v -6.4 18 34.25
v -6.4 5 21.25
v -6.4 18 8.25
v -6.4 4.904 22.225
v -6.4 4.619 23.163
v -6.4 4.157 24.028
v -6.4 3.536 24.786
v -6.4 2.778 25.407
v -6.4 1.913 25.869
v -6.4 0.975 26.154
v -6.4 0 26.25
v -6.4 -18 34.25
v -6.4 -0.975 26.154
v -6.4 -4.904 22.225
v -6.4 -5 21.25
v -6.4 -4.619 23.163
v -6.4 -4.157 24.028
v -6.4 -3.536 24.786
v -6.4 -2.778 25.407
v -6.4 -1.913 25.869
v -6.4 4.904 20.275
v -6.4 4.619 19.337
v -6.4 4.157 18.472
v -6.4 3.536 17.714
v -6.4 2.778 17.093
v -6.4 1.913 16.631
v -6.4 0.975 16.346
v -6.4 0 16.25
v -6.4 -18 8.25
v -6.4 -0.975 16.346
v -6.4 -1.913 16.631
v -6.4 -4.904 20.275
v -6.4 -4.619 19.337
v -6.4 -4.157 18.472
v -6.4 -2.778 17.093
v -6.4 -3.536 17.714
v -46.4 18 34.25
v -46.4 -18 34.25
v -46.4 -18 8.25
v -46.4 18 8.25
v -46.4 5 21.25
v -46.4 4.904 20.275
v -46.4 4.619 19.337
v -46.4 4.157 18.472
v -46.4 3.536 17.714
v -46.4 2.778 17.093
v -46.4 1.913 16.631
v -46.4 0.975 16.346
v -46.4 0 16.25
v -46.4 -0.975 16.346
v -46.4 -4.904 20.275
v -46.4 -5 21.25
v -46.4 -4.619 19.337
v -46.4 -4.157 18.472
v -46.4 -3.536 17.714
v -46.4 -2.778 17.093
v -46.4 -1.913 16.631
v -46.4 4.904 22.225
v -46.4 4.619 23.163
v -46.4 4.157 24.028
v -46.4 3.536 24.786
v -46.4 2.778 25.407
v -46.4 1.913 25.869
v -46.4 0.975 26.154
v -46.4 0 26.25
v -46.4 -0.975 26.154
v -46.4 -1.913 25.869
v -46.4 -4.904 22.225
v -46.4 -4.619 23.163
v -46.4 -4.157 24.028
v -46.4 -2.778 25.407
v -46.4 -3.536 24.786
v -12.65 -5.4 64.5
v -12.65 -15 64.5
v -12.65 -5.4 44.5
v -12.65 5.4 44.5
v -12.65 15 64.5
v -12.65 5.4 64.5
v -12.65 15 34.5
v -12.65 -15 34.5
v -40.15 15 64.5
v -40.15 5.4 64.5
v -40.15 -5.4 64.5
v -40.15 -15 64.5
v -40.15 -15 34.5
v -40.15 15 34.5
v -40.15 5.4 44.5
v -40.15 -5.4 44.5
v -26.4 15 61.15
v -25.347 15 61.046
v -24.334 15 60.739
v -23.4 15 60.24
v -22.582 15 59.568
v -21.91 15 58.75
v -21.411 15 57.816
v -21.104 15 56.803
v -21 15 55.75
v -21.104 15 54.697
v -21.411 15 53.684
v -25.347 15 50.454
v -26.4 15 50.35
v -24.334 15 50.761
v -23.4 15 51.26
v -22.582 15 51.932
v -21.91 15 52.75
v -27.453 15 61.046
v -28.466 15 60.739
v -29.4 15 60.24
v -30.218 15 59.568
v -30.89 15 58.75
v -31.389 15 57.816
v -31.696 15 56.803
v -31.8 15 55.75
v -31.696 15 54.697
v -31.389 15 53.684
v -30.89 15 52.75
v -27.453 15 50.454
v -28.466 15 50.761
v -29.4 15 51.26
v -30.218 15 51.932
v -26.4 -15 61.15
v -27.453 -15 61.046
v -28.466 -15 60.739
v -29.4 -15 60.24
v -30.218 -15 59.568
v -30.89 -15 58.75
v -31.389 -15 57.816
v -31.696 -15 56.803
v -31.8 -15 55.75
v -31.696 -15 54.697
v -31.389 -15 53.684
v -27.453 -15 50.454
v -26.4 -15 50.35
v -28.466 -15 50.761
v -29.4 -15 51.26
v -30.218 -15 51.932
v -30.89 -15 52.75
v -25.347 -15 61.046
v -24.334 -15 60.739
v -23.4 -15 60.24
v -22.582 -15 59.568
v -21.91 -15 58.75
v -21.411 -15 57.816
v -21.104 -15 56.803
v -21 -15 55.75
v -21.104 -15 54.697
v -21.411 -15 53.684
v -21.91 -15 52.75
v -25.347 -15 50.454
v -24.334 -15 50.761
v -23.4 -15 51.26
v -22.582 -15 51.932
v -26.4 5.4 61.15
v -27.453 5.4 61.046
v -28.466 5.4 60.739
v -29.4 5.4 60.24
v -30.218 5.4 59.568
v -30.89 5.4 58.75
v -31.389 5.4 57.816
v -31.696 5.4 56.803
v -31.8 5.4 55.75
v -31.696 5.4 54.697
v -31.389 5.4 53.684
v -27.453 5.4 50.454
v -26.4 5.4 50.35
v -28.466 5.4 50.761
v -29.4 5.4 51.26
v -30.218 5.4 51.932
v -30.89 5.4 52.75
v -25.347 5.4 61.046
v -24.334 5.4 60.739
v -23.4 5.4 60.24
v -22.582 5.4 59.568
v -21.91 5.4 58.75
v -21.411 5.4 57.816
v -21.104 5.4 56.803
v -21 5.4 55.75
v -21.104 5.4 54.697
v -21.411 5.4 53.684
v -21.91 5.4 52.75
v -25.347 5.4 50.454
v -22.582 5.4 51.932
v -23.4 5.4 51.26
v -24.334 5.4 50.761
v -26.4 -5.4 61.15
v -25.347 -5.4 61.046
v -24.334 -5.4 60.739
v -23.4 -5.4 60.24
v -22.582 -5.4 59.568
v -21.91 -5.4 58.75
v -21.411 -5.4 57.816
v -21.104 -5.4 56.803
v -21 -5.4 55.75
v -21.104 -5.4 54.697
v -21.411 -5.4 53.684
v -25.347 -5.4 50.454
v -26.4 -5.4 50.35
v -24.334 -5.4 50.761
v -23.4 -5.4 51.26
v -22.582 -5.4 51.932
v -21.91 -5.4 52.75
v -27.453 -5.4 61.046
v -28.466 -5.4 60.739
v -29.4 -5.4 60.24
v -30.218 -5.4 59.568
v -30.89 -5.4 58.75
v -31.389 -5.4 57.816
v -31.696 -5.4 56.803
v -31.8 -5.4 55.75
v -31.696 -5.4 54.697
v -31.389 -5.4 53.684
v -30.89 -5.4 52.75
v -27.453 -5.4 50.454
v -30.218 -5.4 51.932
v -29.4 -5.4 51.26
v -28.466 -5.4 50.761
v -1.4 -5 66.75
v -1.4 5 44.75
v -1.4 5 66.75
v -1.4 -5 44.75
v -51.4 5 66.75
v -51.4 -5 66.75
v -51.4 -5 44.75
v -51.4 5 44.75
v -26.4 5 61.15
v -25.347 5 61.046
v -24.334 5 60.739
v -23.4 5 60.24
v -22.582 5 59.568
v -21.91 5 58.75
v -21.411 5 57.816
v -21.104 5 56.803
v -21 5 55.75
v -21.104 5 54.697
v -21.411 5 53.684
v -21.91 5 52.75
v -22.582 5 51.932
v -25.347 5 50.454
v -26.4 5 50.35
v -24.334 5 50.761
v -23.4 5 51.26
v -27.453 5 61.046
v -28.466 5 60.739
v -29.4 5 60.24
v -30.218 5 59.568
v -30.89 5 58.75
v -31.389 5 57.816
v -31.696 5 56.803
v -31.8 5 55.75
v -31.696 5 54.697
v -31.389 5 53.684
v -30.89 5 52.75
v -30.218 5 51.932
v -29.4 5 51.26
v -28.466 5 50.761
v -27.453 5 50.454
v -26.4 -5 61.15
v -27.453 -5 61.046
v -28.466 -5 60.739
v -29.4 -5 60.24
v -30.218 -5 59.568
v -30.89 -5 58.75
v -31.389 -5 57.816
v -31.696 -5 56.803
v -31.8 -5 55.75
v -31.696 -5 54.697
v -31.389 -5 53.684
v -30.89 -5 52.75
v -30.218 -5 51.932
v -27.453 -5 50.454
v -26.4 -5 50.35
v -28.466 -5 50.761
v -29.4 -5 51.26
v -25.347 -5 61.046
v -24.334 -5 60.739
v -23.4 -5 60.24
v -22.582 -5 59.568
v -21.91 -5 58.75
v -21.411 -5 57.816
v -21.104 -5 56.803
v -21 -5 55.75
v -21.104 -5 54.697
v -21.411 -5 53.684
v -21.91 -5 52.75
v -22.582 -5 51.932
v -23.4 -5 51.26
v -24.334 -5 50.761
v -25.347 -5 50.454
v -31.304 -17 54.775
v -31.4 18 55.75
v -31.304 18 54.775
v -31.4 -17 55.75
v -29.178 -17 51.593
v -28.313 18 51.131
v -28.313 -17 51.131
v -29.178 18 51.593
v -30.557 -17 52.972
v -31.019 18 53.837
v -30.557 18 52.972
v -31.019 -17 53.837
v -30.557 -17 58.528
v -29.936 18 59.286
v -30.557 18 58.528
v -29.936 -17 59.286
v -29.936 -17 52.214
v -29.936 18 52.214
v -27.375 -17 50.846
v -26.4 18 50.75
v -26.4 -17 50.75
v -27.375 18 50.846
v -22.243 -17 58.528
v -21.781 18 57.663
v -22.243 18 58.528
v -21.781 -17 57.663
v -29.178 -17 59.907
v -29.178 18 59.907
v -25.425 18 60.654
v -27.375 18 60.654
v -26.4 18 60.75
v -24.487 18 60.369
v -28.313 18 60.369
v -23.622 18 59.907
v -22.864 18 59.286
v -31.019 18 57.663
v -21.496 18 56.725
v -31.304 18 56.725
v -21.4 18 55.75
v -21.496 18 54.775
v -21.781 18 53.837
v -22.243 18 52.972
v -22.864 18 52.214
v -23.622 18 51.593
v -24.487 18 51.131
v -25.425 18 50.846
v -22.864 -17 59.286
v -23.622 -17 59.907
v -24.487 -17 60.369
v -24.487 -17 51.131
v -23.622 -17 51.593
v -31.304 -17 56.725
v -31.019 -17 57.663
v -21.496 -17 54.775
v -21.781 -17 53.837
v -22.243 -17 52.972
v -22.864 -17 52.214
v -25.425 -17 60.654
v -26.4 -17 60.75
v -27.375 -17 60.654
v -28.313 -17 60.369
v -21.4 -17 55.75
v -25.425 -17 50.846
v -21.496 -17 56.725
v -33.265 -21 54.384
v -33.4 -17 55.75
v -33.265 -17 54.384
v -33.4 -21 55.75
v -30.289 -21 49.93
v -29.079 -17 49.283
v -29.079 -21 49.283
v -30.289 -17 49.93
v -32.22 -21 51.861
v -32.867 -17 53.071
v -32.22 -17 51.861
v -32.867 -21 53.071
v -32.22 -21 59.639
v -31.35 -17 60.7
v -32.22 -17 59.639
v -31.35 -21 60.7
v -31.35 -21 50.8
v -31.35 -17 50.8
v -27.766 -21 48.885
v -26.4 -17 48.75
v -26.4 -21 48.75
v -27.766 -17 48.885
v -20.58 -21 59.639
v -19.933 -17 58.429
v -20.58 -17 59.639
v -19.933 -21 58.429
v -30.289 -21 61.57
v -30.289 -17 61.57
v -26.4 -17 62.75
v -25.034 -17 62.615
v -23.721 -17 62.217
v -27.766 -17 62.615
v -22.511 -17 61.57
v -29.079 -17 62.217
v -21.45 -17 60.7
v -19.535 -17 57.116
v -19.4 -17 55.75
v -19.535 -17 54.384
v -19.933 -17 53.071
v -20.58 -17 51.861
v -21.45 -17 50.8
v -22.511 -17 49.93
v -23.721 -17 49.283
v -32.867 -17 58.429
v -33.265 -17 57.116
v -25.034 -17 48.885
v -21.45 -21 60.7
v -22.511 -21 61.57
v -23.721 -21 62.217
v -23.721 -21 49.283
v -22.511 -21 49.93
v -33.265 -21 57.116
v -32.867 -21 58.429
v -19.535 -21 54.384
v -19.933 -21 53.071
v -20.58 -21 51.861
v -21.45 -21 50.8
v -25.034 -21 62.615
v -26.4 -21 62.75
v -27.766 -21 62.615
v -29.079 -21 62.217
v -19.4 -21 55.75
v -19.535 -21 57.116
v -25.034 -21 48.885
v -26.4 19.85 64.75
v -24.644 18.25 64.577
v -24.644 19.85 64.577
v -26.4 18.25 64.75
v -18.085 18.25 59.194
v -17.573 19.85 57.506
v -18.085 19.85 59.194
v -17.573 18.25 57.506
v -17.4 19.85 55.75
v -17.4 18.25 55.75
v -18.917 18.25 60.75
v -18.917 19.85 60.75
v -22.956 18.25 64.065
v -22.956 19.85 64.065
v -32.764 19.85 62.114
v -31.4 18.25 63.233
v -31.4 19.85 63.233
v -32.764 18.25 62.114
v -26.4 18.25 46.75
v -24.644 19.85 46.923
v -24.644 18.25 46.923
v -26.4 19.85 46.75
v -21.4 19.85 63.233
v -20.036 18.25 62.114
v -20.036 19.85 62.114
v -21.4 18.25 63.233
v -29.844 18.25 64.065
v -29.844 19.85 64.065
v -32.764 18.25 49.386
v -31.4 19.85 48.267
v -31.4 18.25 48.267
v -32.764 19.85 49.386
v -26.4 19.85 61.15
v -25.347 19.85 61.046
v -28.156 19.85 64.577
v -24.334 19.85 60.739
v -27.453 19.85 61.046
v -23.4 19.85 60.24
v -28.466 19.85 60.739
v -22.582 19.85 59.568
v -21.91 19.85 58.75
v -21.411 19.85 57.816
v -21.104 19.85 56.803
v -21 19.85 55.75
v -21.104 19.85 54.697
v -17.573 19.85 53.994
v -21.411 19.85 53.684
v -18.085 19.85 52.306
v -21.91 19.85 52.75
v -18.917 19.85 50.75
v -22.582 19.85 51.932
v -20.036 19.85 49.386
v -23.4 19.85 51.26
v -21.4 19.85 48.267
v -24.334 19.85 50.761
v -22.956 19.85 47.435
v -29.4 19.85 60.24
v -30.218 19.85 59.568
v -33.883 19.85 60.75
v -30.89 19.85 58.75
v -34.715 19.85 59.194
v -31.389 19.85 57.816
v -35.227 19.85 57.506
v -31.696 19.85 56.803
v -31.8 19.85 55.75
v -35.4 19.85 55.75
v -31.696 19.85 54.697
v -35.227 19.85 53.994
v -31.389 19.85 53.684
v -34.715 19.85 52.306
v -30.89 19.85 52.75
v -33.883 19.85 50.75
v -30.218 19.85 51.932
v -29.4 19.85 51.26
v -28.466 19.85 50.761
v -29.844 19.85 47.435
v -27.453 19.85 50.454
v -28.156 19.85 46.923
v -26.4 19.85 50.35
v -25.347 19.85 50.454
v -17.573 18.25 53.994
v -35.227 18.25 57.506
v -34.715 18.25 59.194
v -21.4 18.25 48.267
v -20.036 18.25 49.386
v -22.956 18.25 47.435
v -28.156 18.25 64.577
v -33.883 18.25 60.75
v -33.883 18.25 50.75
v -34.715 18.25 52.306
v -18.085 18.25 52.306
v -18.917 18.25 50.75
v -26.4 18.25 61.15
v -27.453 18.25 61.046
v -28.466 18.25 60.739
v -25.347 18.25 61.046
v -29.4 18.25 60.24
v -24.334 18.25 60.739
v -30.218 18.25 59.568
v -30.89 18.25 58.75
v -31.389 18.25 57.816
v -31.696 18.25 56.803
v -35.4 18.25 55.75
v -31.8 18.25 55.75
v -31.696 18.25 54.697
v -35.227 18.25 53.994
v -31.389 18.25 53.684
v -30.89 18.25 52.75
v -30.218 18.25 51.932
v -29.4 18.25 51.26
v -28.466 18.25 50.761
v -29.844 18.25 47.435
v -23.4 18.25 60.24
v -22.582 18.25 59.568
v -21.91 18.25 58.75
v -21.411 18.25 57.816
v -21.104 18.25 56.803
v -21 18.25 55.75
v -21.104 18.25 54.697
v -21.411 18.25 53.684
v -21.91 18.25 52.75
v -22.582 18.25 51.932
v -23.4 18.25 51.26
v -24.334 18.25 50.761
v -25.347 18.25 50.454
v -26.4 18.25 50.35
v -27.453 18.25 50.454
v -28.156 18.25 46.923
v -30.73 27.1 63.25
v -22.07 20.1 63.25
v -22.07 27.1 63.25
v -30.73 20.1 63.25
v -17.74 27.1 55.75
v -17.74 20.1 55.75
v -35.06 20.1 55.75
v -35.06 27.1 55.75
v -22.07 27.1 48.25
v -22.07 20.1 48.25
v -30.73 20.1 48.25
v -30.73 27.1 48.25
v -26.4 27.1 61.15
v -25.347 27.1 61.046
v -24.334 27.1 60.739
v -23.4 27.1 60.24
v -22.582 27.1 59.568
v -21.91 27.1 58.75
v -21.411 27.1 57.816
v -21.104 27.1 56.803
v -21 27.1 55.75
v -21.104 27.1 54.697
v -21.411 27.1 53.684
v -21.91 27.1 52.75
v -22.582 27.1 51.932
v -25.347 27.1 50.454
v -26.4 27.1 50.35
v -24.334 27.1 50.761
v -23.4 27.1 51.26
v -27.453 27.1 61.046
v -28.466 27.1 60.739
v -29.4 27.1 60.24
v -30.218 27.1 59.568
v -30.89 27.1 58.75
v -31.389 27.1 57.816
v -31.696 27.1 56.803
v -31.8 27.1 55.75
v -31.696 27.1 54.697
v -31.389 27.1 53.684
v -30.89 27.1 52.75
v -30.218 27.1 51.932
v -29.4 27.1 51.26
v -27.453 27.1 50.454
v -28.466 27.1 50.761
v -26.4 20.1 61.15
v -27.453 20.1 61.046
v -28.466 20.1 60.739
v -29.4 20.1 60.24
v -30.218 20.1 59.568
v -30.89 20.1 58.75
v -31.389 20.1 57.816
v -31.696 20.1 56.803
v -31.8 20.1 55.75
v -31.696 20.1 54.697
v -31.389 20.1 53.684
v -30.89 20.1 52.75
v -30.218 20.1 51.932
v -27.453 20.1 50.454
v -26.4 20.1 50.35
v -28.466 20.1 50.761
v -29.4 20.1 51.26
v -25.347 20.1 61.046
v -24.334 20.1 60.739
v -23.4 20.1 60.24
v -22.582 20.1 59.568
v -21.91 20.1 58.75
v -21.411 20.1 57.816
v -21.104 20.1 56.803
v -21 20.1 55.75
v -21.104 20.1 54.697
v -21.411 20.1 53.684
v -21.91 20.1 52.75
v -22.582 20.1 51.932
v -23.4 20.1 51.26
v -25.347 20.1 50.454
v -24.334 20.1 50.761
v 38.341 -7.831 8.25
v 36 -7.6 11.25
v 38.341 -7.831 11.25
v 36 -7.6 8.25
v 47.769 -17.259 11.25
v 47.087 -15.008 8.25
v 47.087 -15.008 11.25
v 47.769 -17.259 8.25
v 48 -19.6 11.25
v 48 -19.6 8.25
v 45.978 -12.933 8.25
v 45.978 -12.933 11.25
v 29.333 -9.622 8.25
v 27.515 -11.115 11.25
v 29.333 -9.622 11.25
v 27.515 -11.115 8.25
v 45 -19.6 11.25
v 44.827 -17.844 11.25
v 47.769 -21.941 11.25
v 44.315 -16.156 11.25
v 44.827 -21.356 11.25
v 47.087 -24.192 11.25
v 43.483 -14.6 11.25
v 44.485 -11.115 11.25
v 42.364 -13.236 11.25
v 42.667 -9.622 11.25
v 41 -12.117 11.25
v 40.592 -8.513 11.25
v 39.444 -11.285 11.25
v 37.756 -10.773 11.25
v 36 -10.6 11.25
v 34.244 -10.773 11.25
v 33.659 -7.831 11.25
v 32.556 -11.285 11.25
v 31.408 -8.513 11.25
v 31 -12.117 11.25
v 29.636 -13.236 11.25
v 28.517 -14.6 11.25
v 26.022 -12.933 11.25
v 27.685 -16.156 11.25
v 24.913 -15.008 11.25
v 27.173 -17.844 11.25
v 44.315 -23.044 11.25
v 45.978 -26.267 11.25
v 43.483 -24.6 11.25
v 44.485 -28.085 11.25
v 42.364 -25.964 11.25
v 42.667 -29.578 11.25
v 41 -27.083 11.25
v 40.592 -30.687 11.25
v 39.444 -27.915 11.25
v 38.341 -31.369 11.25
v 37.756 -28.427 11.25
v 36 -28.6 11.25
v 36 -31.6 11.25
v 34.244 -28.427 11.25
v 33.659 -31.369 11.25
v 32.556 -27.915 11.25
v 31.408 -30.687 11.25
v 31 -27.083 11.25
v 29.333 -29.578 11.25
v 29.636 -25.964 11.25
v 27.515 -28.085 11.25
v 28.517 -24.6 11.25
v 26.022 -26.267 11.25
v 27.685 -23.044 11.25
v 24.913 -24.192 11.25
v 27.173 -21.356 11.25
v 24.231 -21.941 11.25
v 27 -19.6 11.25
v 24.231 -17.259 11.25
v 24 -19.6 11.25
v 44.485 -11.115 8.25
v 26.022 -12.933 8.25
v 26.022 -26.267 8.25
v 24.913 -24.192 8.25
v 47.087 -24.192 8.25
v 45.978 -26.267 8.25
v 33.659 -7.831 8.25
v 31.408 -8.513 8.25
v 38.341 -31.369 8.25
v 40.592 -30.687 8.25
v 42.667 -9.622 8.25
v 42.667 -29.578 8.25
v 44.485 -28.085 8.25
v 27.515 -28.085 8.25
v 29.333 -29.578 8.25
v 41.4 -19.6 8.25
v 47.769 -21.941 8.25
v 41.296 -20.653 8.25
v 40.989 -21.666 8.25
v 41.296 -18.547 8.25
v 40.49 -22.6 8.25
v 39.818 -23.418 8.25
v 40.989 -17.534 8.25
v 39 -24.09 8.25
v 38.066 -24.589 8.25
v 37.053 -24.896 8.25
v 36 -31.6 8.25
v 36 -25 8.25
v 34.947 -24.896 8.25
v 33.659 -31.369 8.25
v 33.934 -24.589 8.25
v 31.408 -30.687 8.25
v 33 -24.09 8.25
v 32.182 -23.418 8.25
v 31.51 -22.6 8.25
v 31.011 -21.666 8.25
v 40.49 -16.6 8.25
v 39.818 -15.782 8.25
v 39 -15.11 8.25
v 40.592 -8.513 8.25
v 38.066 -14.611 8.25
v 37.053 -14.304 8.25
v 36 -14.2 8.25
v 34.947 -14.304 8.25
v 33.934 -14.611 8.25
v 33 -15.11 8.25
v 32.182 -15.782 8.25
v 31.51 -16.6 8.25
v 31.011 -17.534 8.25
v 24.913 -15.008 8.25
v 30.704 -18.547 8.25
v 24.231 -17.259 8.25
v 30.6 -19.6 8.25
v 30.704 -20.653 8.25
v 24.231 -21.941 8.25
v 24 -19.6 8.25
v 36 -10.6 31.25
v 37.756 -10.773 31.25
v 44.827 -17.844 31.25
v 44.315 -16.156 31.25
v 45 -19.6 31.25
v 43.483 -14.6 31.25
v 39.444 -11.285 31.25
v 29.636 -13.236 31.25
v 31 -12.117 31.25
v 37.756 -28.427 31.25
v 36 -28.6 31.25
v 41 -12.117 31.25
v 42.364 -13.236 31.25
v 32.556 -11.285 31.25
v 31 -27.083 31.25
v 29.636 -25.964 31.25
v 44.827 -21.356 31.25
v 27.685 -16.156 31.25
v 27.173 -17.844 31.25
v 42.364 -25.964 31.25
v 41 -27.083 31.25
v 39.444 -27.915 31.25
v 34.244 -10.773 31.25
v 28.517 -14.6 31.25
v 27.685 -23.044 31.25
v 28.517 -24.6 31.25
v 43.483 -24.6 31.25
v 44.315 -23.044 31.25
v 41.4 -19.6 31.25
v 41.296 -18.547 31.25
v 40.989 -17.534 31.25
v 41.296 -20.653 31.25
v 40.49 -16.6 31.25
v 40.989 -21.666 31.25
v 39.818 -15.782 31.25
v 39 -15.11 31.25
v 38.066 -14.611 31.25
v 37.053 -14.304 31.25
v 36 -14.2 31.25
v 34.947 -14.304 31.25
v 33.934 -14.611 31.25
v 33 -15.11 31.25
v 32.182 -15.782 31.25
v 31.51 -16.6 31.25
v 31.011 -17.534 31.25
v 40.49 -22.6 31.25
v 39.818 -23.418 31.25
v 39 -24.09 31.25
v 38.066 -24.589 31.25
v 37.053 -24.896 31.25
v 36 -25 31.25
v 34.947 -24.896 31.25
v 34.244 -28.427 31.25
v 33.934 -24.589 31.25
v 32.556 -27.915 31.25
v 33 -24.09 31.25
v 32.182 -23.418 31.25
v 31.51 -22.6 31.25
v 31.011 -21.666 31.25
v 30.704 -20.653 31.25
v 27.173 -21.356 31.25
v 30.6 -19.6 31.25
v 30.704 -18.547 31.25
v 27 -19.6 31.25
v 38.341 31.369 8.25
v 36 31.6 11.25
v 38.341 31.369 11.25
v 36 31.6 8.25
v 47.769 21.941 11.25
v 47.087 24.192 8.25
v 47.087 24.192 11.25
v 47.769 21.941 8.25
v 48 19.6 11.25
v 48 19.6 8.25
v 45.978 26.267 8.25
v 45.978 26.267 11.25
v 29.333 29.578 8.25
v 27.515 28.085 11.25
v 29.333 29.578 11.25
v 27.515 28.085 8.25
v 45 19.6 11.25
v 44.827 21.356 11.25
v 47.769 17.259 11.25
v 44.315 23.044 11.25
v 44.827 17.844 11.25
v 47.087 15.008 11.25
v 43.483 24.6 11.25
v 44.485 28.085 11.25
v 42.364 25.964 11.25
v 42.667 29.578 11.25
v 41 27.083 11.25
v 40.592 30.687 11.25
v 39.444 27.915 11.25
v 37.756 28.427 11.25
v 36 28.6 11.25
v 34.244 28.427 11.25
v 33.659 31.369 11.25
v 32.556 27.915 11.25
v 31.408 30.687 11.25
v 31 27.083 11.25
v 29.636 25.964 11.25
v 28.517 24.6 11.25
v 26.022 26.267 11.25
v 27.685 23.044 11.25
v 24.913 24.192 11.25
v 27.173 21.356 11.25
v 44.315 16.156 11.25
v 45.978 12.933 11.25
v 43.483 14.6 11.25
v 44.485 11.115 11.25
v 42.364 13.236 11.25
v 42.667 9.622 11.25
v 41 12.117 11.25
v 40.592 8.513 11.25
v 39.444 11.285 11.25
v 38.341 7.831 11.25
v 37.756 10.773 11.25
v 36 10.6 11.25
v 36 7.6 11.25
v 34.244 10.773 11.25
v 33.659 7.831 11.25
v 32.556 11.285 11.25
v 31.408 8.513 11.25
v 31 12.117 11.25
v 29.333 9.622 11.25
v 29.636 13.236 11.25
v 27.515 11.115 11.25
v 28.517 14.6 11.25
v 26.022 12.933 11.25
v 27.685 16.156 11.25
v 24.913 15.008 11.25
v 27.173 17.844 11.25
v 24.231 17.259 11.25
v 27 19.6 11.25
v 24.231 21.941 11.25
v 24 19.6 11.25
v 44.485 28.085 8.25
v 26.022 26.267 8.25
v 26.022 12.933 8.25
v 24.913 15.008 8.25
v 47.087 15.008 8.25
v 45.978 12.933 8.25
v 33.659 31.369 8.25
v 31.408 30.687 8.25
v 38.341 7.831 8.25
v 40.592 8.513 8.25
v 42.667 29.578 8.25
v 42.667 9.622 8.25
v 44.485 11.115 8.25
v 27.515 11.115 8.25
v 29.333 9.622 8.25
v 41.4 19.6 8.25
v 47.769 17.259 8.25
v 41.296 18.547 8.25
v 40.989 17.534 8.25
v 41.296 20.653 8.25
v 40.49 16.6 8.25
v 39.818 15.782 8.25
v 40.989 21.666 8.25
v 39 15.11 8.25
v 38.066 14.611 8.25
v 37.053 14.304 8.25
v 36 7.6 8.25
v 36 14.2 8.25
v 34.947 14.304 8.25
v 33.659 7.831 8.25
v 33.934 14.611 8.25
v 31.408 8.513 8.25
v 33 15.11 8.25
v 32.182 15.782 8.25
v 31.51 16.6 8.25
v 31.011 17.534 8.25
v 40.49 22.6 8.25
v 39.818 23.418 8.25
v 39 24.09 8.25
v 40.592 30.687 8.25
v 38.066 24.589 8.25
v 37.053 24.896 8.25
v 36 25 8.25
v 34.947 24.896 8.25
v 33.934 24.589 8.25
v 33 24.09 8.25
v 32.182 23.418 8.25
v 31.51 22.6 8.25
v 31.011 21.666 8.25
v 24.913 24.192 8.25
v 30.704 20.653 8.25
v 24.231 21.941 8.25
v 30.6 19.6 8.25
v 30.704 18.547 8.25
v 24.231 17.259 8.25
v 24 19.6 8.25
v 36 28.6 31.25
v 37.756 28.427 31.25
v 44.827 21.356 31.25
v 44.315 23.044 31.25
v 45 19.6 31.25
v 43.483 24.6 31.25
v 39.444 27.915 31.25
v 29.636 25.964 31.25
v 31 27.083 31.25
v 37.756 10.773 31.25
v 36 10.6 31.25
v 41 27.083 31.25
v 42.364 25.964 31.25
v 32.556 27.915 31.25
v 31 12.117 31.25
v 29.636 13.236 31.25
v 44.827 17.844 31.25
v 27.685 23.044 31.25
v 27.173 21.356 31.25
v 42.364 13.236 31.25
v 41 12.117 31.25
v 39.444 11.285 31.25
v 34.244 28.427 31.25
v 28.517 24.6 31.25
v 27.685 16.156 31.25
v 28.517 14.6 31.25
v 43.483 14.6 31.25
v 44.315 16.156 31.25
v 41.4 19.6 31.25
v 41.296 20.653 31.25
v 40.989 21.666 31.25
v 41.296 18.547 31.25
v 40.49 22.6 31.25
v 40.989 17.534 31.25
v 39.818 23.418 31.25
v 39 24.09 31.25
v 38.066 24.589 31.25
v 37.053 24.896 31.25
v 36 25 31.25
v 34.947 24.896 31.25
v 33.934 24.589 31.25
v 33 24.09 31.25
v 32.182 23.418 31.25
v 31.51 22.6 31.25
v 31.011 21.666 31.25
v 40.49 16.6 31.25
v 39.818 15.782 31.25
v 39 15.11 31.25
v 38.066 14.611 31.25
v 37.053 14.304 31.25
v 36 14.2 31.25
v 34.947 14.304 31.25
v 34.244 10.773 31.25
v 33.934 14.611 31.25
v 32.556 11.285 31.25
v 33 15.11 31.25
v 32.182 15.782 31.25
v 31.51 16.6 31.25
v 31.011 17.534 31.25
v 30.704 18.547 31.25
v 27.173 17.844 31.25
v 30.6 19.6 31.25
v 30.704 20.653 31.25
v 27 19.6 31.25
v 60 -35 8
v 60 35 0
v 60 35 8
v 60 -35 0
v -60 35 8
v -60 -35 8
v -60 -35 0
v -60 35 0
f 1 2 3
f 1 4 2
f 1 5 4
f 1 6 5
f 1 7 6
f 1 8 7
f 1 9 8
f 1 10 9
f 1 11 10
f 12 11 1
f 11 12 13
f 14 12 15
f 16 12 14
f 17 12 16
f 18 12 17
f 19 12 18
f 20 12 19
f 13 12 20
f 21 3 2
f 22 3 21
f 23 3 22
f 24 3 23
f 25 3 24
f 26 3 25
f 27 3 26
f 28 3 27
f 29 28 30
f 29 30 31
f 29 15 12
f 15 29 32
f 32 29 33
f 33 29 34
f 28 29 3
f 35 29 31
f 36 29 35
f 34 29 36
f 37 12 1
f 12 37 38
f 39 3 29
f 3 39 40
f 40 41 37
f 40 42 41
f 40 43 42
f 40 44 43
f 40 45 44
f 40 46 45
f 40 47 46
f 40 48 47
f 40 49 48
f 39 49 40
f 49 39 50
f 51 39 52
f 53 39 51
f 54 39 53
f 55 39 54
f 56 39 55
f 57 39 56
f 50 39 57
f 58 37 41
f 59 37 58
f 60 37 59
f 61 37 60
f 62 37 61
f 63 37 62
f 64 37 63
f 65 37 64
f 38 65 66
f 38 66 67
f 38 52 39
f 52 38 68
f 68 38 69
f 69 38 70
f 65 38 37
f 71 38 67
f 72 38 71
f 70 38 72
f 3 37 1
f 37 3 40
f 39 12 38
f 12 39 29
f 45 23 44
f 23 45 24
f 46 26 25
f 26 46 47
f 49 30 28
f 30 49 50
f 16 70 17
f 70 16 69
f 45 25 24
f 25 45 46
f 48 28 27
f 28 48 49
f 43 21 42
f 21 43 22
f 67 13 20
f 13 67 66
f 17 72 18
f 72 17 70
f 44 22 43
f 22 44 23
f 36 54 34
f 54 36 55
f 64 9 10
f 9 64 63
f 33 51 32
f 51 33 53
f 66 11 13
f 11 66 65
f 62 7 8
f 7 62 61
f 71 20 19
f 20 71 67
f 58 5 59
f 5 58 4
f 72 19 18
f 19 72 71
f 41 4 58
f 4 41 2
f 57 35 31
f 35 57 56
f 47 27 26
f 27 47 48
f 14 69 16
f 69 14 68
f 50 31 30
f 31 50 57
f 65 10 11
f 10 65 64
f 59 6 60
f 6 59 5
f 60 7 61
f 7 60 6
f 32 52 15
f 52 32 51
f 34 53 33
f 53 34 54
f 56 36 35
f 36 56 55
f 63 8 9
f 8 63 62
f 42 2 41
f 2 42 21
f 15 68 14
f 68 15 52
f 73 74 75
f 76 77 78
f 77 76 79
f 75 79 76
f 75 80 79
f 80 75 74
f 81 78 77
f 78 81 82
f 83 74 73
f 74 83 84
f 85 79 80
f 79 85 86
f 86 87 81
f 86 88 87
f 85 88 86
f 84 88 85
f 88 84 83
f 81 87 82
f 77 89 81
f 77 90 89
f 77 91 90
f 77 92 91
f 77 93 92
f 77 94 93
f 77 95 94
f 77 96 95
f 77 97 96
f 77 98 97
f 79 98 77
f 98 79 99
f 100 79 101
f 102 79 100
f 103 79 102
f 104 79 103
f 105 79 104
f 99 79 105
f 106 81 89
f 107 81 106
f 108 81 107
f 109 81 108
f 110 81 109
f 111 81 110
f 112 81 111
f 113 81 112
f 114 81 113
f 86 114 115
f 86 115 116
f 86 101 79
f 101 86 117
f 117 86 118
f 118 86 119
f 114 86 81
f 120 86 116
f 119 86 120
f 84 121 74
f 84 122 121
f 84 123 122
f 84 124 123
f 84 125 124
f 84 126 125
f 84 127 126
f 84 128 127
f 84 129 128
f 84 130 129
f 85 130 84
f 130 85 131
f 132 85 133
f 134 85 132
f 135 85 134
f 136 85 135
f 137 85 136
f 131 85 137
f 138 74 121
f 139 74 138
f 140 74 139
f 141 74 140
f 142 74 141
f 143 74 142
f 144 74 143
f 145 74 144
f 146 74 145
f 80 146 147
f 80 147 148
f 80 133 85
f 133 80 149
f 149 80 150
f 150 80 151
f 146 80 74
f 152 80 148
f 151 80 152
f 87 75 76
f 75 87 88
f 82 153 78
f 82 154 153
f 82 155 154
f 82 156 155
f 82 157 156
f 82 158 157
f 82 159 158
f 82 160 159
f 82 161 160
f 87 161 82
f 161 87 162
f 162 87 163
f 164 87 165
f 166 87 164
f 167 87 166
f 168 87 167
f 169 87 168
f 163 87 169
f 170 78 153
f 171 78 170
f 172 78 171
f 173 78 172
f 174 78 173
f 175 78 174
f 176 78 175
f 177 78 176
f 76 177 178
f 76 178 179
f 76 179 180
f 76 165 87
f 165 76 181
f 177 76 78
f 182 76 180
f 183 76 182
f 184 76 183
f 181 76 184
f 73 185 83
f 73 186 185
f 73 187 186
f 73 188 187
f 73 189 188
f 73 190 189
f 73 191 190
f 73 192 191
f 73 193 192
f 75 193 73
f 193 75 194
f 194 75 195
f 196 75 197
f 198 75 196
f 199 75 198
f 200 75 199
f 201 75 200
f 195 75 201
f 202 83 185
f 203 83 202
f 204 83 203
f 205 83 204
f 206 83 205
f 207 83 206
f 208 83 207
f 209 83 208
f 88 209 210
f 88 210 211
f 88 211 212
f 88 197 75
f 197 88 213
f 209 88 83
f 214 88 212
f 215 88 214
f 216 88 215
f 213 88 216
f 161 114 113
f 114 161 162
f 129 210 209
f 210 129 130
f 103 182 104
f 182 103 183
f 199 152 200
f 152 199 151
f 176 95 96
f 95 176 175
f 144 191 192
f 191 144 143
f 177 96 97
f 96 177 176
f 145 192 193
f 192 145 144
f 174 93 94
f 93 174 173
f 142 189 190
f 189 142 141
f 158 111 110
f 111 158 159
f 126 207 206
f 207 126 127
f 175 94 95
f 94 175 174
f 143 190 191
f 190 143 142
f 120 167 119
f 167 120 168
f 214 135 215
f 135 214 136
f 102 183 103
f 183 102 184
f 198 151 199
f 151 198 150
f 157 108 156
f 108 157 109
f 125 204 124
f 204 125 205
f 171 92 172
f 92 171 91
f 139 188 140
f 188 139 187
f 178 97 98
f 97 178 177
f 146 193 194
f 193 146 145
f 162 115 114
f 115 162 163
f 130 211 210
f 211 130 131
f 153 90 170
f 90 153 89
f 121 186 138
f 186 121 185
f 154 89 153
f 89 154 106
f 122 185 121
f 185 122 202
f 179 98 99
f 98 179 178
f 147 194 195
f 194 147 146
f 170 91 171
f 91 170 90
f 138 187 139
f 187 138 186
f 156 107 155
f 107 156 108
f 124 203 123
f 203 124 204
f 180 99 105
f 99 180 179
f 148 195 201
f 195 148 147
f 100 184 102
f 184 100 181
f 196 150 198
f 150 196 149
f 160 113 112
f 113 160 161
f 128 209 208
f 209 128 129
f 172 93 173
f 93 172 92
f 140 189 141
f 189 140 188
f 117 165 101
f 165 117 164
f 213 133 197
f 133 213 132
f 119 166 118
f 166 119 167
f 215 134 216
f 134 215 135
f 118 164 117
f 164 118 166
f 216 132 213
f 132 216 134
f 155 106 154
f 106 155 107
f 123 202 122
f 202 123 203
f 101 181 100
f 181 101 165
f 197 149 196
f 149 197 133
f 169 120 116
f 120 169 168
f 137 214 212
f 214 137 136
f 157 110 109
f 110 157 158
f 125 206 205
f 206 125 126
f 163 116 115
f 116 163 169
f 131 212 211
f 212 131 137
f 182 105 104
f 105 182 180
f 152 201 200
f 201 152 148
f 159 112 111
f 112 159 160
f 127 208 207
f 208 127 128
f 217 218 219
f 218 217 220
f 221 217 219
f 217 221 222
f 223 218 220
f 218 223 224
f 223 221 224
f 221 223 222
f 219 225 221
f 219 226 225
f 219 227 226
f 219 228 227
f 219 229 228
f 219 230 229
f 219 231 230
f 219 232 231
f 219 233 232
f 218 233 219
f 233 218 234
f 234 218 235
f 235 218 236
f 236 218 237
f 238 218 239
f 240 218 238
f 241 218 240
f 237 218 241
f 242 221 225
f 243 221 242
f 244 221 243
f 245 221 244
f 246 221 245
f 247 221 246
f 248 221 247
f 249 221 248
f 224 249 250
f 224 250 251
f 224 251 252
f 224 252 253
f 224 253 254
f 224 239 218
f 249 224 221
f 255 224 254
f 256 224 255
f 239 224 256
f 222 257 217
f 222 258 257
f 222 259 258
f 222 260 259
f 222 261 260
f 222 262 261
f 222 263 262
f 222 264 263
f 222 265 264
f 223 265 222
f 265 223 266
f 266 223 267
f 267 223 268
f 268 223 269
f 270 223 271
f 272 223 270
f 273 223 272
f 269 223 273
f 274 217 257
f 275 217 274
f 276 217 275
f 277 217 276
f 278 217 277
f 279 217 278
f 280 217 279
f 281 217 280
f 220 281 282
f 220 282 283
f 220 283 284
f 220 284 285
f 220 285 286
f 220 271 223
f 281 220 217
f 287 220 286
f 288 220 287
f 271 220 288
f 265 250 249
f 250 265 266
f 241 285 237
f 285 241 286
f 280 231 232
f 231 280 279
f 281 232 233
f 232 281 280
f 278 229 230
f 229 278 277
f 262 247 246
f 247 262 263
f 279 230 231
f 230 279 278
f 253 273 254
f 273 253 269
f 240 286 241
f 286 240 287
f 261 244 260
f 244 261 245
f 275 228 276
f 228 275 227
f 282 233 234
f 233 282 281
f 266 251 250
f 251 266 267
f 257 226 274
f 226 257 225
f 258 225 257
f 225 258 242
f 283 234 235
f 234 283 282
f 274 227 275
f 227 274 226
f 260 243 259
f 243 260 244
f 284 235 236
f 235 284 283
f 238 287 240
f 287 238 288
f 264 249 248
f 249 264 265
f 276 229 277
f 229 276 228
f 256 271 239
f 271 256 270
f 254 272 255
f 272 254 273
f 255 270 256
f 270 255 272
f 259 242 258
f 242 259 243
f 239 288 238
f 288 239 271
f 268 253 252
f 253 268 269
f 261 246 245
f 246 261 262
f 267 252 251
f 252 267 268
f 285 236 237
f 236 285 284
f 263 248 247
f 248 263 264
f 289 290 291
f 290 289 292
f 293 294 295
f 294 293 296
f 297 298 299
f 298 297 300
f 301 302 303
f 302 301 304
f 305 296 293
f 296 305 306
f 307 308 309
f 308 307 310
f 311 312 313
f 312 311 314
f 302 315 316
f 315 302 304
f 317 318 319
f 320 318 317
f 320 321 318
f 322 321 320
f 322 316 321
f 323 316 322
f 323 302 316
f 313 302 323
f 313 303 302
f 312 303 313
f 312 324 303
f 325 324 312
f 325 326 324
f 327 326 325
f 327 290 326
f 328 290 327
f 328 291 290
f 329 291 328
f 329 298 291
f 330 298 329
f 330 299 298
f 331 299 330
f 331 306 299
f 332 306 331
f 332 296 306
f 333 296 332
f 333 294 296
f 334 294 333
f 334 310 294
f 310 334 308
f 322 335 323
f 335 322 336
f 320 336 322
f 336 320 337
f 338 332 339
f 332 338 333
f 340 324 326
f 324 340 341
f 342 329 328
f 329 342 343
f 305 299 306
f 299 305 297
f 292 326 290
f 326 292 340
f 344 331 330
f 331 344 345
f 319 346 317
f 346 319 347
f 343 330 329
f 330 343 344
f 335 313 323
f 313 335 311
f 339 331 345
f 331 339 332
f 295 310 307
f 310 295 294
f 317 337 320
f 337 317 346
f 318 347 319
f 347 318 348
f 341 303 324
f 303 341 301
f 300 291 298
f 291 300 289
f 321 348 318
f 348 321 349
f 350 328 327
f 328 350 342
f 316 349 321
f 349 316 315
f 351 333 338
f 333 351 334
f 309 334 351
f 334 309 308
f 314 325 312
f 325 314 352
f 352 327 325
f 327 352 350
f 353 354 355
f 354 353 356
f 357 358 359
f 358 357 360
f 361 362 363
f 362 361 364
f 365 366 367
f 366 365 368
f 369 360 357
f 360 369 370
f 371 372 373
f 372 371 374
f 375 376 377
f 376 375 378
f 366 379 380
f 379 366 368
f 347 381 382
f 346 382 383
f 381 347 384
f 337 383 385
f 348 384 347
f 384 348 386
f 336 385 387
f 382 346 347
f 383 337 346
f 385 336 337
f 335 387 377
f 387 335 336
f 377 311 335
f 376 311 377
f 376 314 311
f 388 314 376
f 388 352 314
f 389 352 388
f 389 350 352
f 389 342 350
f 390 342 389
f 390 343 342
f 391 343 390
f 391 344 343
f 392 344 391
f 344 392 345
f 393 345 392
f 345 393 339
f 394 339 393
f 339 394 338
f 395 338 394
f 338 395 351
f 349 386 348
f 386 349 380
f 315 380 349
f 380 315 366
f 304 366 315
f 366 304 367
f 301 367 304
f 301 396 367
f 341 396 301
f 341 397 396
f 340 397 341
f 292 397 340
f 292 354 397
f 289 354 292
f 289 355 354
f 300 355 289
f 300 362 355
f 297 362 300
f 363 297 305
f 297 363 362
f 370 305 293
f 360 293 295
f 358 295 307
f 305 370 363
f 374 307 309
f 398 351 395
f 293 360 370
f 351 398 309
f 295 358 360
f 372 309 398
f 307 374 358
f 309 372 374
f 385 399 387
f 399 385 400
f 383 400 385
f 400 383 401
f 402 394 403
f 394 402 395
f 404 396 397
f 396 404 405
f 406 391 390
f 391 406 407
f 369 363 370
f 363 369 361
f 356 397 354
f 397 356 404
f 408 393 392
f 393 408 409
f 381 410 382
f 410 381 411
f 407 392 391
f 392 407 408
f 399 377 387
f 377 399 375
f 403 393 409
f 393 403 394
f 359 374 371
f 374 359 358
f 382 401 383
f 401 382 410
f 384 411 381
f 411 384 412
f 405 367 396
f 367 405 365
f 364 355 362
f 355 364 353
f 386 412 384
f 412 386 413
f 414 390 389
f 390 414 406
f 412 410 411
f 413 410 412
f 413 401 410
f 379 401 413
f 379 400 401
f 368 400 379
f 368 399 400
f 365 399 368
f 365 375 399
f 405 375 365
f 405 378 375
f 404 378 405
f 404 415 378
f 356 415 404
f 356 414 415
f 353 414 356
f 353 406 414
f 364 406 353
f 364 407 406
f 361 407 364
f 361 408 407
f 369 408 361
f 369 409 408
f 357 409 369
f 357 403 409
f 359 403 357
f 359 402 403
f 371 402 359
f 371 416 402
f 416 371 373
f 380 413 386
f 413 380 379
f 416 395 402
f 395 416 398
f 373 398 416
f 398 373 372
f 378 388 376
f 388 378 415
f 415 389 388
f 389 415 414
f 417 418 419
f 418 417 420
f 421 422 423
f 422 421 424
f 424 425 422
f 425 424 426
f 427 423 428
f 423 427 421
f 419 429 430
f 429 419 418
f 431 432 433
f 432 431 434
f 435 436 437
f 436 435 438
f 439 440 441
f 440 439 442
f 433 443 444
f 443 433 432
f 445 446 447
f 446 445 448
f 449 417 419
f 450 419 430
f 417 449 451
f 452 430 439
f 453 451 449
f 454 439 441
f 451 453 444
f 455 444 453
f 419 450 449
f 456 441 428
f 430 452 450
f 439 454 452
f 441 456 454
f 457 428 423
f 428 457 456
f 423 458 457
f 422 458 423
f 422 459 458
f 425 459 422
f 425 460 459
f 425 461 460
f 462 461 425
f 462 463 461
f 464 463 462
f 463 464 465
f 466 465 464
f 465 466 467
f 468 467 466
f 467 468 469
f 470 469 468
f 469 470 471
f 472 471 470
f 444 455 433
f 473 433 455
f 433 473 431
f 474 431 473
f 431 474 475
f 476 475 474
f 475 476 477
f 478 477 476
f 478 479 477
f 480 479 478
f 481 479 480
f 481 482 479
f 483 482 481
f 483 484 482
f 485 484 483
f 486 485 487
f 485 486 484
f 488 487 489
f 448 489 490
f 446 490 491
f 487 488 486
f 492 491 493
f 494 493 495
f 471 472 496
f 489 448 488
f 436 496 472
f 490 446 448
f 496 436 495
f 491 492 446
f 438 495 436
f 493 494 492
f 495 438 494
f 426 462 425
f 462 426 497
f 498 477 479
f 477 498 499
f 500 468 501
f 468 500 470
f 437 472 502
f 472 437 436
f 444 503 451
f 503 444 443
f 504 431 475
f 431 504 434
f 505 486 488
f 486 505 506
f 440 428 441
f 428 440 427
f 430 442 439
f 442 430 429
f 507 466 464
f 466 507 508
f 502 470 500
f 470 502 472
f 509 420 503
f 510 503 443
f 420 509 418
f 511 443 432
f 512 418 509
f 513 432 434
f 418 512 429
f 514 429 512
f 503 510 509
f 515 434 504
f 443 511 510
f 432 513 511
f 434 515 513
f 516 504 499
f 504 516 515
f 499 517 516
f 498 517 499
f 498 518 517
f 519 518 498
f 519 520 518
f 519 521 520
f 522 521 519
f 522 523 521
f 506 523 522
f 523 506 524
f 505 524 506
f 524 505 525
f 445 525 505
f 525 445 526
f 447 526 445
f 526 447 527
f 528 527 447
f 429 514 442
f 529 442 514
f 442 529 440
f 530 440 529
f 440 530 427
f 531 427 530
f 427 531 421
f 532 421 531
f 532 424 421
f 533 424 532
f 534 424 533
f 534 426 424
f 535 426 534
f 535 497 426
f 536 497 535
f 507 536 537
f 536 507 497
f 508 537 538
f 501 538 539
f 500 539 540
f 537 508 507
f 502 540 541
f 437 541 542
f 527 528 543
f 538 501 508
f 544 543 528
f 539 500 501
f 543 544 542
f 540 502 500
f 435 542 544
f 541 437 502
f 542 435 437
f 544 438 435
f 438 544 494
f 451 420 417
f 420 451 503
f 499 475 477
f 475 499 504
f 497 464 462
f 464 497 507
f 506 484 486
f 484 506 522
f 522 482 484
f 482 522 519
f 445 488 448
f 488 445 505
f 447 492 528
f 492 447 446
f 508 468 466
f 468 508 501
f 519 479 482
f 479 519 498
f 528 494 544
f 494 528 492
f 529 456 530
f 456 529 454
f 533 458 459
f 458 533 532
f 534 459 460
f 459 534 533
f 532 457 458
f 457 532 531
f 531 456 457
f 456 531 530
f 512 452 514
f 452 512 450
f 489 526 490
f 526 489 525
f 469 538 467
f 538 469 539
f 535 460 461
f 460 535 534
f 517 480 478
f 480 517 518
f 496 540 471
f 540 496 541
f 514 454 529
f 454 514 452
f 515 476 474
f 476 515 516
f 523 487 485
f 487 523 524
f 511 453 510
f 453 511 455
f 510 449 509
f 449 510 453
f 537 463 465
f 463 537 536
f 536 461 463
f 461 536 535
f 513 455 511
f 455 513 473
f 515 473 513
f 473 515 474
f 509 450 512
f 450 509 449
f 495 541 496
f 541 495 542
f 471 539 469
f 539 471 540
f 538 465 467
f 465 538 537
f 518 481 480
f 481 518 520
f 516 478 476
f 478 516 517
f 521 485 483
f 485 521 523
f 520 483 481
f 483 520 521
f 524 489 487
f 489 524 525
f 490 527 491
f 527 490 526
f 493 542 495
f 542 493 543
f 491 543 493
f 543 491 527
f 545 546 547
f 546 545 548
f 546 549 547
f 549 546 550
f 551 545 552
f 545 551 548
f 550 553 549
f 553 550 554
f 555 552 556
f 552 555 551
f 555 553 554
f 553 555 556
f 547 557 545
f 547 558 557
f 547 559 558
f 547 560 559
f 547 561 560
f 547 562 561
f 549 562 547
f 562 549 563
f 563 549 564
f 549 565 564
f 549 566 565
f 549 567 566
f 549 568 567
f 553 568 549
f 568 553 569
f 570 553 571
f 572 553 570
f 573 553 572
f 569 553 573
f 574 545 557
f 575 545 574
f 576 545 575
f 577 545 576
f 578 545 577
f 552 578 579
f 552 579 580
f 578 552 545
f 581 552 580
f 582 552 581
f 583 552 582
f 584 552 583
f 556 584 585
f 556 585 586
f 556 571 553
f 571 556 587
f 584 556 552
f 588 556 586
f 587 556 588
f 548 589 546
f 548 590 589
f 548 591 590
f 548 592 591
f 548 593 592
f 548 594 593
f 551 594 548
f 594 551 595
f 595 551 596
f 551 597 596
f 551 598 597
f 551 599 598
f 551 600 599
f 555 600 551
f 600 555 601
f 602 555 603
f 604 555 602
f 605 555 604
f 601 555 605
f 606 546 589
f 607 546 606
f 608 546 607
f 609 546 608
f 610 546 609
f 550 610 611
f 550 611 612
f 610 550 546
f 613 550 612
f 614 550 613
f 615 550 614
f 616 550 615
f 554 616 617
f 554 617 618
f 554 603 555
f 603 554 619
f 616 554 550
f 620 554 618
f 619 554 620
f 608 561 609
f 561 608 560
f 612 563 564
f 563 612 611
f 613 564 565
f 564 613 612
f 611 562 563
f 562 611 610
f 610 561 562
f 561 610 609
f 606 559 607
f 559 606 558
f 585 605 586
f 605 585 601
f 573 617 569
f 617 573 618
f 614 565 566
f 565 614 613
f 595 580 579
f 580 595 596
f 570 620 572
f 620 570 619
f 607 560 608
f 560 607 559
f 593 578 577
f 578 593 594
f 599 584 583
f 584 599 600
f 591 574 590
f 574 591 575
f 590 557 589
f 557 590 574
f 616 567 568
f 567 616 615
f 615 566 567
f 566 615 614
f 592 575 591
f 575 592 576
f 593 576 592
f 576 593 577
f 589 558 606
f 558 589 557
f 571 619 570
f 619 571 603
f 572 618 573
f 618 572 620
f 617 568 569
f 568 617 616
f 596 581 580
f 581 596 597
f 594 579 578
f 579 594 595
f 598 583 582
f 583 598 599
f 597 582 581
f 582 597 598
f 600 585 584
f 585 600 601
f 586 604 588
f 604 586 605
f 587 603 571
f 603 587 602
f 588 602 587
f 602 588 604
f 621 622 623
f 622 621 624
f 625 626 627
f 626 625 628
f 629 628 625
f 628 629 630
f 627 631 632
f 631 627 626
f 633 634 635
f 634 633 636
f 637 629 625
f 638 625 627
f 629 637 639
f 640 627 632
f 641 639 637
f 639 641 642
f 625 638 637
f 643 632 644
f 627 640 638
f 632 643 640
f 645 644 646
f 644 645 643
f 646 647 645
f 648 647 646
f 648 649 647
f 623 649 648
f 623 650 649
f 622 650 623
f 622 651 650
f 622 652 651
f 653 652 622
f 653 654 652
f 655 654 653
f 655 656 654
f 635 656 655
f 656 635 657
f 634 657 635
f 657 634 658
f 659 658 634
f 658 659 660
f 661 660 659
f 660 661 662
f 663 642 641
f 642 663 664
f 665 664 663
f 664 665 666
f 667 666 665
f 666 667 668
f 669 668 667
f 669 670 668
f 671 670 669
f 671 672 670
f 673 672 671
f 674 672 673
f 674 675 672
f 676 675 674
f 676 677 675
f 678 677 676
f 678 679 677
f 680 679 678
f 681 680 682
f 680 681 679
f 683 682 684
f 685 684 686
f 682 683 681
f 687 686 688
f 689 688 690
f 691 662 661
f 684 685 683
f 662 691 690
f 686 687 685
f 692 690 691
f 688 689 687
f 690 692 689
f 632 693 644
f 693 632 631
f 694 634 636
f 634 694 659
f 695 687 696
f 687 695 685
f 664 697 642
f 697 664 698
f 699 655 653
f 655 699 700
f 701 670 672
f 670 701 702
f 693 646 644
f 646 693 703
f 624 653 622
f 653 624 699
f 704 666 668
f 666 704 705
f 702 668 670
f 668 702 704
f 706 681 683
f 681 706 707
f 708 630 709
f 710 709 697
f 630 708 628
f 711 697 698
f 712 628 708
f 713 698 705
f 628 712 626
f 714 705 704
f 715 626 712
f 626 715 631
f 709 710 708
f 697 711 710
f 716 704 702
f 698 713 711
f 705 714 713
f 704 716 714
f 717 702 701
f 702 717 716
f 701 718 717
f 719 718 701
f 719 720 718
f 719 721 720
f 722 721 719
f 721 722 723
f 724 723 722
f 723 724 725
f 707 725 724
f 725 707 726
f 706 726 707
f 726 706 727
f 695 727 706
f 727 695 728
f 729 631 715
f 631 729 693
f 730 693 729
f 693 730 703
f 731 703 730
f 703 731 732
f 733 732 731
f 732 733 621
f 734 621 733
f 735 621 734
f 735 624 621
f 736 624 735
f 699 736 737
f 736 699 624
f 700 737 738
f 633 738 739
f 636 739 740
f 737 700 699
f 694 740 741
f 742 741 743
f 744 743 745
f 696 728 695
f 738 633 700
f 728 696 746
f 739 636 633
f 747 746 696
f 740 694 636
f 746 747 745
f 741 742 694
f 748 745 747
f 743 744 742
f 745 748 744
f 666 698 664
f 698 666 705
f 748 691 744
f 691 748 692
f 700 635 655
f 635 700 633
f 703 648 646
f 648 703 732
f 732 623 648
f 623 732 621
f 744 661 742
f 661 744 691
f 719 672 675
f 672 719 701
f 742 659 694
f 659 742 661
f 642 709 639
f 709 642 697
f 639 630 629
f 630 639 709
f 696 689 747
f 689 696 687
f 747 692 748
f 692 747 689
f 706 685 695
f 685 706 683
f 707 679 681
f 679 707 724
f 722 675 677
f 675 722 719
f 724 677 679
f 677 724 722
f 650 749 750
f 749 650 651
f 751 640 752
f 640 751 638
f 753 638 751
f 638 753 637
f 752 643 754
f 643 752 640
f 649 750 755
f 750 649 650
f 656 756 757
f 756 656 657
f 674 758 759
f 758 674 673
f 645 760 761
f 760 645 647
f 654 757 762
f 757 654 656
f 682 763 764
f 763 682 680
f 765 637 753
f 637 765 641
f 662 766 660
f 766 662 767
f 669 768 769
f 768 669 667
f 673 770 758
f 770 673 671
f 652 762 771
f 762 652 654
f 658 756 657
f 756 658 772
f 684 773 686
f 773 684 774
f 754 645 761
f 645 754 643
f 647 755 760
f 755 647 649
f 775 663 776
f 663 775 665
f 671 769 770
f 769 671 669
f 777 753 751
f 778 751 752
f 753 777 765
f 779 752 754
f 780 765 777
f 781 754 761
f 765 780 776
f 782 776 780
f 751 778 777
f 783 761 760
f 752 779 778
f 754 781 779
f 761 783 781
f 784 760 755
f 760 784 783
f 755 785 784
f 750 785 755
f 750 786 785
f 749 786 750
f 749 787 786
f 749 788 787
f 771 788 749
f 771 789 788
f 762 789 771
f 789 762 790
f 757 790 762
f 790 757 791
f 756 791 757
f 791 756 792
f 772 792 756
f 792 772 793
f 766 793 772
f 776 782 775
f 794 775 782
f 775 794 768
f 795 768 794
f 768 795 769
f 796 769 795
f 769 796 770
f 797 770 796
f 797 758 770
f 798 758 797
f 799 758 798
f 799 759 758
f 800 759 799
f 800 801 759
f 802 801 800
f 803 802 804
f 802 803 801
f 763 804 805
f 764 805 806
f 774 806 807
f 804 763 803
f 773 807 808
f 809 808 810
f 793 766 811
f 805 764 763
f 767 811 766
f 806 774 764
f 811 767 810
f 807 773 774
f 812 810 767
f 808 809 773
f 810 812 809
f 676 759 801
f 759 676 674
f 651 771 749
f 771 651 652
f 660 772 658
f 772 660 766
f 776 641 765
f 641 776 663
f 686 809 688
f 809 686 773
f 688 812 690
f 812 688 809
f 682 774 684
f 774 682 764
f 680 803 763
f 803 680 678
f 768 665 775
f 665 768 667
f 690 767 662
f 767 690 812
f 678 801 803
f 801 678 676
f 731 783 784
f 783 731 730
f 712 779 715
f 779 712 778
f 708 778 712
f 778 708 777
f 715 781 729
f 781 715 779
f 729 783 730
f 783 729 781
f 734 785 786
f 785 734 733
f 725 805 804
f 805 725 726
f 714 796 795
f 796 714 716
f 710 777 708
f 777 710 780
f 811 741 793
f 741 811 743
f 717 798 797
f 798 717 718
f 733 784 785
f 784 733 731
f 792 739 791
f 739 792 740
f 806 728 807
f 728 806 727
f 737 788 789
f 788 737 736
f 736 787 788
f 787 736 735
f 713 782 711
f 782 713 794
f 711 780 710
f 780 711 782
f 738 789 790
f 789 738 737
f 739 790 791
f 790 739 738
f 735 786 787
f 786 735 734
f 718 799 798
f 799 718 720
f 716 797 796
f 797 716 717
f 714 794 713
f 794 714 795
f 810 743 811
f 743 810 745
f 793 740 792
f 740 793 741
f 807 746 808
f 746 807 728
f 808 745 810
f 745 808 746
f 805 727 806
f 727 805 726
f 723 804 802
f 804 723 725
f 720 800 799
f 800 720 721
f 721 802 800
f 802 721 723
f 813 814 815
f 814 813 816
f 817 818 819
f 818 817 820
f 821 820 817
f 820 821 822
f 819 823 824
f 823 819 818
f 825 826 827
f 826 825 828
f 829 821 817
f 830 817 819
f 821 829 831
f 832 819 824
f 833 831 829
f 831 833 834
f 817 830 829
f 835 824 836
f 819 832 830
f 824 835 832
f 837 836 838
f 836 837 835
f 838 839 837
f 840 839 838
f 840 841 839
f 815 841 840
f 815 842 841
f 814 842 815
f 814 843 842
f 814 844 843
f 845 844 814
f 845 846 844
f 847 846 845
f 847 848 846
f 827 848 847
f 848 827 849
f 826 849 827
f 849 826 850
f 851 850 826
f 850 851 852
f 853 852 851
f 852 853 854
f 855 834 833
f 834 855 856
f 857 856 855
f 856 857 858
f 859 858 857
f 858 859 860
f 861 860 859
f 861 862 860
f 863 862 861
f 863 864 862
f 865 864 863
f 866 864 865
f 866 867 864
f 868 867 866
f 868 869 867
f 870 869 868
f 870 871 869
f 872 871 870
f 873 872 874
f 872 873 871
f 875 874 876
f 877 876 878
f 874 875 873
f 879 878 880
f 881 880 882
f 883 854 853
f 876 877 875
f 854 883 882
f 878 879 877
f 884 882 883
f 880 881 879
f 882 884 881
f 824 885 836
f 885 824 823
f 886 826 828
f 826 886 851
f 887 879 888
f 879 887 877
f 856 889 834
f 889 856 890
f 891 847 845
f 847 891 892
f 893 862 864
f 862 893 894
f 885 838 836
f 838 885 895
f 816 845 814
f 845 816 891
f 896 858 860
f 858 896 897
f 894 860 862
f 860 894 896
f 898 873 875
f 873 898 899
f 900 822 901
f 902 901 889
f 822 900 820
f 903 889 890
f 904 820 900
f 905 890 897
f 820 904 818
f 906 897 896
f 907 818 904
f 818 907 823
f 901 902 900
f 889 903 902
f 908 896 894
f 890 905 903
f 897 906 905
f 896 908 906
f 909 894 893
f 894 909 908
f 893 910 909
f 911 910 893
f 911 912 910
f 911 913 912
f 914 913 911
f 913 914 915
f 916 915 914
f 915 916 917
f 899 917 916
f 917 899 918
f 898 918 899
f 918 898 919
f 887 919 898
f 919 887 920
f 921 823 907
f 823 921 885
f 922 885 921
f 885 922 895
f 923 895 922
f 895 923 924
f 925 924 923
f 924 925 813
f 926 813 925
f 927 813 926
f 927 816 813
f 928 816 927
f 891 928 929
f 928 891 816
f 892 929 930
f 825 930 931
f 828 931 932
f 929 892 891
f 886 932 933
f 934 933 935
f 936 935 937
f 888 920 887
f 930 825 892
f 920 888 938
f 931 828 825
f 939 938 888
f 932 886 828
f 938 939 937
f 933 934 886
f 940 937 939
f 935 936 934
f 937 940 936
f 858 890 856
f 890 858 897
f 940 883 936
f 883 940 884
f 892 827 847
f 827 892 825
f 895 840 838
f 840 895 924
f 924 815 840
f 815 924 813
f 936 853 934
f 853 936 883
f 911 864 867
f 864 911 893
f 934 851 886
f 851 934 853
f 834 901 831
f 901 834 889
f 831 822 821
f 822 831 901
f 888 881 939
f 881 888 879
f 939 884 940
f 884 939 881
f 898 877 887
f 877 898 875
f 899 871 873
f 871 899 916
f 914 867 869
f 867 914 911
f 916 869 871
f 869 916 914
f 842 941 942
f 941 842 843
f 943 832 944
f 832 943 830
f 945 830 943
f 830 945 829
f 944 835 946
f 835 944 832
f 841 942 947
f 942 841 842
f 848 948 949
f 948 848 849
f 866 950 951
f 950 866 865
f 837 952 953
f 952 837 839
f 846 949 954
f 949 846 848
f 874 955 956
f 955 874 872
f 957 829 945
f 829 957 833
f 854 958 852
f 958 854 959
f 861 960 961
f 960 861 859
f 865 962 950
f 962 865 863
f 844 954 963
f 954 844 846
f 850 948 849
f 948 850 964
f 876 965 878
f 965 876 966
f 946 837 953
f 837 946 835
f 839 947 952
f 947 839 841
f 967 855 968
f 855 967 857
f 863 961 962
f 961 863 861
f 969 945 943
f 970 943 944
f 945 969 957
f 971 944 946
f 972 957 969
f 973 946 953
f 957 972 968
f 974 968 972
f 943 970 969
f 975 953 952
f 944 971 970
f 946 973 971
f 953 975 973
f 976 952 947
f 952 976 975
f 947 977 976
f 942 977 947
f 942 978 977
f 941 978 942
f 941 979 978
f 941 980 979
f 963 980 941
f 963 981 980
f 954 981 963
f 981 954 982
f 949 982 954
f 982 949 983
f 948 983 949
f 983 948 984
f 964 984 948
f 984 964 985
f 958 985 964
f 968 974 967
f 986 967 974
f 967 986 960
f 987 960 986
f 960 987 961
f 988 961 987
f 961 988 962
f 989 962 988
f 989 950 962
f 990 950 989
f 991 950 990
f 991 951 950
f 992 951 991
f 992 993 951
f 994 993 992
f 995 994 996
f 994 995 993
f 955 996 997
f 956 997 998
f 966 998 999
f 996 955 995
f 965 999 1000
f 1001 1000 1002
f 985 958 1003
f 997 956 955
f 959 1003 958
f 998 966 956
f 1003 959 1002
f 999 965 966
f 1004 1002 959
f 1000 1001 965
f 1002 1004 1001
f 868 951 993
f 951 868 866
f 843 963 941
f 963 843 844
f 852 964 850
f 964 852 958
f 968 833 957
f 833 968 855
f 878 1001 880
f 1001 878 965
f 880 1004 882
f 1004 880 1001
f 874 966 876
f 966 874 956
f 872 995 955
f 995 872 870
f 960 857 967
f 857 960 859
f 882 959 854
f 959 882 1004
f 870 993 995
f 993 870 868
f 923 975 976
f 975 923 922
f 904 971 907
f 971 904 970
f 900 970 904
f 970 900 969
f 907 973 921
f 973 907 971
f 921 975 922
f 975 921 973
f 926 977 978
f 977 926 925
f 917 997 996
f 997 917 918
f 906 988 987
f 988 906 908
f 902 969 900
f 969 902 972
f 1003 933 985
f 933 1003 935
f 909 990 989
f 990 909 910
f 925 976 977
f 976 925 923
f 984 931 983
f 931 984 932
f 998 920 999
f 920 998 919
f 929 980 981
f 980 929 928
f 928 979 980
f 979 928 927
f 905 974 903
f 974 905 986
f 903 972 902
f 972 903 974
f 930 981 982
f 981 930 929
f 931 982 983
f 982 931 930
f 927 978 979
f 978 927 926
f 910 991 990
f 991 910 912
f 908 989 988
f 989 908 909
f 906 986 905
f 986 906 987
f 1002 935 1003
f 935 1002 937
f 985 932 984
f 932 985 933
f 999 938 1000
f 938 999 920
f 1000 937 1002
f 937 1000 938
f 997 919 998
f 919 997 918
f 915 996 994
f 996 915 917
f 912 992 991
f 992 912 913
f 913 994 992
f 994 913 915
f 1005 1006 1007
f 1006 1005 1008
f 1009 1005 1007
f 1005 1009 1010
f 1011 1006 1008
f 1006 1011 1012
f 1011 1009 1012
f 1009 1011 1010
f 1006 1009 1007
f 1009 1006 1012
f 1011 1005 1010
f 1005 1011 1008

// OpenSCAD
$fn = 32;

// ------------------------------------------------------------------------
// Indexing jig: plate 120 x 70 mm, pin d10
// Every part is its own module, assembly() places every instance.
// ------------------------------------------------------------------------

// --- part 1 ---
module jig_plate() {
  difference() {
    translate([-60, -35, 0]) cube([120, 70, 8]);
  }
}

// --- part 2 ---
module locator_block() {
  difference() {
    translate([-20, -18, 0]) cube([40, 36, 26]);
    translate([0, 0, 13]) rotate([0, 90, 0]) cylinder(h = 42, d = 10, center = true);
  }
}

// --- part 3 ---
module index_fork() {
  difference() {
    translate([-13.75, -15, 0]) cube([27.5, 30, 30]);
    translate([-14.75, -5.4, 10]) cube([29.5, 10.8, 21]);
    translate([0, 0, 21.25]) rotate([90, 0, 0]) cylinder(h = 32, d = 10.8, center = true);
  }
}

// --- part 4 ---
module index_arm() {
  difference() {
    translate([-25, -5, 0]) cube([50, 10, 22]);
    translate([0, 0, 11]) rotate([90, 0, 0]) cylinder(h = 12, d = 10.8, center = true);
  }
}

// --- part 5 ---
module index_pin() {
  rotate([0, 90, 0]) cylinder(h = 36, d = 10, center = true);
  translate([-21, 0, 0]) rotate([0, 90, 0]) cylinder(h = 4, d = 14);
}

// --- part 6 ---
module pin_washer() {
  difference() {
      translate([0, 0, 0]) cylinder(h = 1.6, d = 18);
      translate([0, 0, -1]) cylinder(h = 3.6, d = 10.8);
    }
}

// --- part 7 ---
module lock_nut() {
  difference() {
    linear_extrude(height = 7) polygon(points = [[8.66, 0], [4.33, 7.5], [-4.33, 7.5], [-8.66, 0], [-4.33, -7.5], [4.33, -7.5]]);
    translate([0, 0, -1]) cylinder(h = 9, d = 10.8);
  }
}

// --- part 8 ---
module guide_bush_a() {
  difference() {
    union() {
      cylinder(h = 3, d = 24);
      translate([0, 0, 3]) cylinder(h = 20, d = 18);
    }
    translate([0, 0, -1]) cylinder(h = 25, d = 10.8);
  }
}

// --- part 9 ---
module guide_bush_b() {
  difference() {
    union() {
      cylinder(h = 3, d = 24);
      translate([0, 0, 3]) cylinder(h = 20, d = 18);
    }
    translate([0, 0, -1]) cylinder(h = 25, d = 10.8);
  }
}

// --- assembly ---
module assembly() {
  color([0.80, 0.24, 0.20]) translate([0, 0, 0]) rotate([0, 0, 0]) jig_plate();
  color([0.20, 0.45, 0.75]) translate([-26.4, 0, 8.25]) rotate([0, 0, 0]) locator_block();
  color([0.25, 0.62, 0.32]) translate([-26.4, 0, 34.5]) rotate([0, 0, 0]) index_fork();
  color([0.92, 0.70, 0.18]) translate([-26.4, 0, 44.75]) rotate([0, 0, 0]) index_arm();
  color([0.58, 0.35, 0.70]) translate([-26.4, 0, 55.75]) rotate([0, 0, 90]) index_pin();
  color([0.16, 0.66, 0.66]) translate([-26.4, 19.85, 55.75]) rotate([90, 0, 0]) pin_washer();
  color([0.85, 0.48, 0.18]) translate([-26.4, 27.1, 55.75]) rotate([90, 0, 0]) lock_nut();
  color([0.55, 0.60, 0.65]) translate([36, -19.6, 8.25]) rotate([0, 0, 0]) guide_bush_a();
  color([0.75, 0.30, 0.55]) translate([36, 19.6, 8.25]) rotate([0, 0, 0]) guide_bush_b();
}

assembly();
